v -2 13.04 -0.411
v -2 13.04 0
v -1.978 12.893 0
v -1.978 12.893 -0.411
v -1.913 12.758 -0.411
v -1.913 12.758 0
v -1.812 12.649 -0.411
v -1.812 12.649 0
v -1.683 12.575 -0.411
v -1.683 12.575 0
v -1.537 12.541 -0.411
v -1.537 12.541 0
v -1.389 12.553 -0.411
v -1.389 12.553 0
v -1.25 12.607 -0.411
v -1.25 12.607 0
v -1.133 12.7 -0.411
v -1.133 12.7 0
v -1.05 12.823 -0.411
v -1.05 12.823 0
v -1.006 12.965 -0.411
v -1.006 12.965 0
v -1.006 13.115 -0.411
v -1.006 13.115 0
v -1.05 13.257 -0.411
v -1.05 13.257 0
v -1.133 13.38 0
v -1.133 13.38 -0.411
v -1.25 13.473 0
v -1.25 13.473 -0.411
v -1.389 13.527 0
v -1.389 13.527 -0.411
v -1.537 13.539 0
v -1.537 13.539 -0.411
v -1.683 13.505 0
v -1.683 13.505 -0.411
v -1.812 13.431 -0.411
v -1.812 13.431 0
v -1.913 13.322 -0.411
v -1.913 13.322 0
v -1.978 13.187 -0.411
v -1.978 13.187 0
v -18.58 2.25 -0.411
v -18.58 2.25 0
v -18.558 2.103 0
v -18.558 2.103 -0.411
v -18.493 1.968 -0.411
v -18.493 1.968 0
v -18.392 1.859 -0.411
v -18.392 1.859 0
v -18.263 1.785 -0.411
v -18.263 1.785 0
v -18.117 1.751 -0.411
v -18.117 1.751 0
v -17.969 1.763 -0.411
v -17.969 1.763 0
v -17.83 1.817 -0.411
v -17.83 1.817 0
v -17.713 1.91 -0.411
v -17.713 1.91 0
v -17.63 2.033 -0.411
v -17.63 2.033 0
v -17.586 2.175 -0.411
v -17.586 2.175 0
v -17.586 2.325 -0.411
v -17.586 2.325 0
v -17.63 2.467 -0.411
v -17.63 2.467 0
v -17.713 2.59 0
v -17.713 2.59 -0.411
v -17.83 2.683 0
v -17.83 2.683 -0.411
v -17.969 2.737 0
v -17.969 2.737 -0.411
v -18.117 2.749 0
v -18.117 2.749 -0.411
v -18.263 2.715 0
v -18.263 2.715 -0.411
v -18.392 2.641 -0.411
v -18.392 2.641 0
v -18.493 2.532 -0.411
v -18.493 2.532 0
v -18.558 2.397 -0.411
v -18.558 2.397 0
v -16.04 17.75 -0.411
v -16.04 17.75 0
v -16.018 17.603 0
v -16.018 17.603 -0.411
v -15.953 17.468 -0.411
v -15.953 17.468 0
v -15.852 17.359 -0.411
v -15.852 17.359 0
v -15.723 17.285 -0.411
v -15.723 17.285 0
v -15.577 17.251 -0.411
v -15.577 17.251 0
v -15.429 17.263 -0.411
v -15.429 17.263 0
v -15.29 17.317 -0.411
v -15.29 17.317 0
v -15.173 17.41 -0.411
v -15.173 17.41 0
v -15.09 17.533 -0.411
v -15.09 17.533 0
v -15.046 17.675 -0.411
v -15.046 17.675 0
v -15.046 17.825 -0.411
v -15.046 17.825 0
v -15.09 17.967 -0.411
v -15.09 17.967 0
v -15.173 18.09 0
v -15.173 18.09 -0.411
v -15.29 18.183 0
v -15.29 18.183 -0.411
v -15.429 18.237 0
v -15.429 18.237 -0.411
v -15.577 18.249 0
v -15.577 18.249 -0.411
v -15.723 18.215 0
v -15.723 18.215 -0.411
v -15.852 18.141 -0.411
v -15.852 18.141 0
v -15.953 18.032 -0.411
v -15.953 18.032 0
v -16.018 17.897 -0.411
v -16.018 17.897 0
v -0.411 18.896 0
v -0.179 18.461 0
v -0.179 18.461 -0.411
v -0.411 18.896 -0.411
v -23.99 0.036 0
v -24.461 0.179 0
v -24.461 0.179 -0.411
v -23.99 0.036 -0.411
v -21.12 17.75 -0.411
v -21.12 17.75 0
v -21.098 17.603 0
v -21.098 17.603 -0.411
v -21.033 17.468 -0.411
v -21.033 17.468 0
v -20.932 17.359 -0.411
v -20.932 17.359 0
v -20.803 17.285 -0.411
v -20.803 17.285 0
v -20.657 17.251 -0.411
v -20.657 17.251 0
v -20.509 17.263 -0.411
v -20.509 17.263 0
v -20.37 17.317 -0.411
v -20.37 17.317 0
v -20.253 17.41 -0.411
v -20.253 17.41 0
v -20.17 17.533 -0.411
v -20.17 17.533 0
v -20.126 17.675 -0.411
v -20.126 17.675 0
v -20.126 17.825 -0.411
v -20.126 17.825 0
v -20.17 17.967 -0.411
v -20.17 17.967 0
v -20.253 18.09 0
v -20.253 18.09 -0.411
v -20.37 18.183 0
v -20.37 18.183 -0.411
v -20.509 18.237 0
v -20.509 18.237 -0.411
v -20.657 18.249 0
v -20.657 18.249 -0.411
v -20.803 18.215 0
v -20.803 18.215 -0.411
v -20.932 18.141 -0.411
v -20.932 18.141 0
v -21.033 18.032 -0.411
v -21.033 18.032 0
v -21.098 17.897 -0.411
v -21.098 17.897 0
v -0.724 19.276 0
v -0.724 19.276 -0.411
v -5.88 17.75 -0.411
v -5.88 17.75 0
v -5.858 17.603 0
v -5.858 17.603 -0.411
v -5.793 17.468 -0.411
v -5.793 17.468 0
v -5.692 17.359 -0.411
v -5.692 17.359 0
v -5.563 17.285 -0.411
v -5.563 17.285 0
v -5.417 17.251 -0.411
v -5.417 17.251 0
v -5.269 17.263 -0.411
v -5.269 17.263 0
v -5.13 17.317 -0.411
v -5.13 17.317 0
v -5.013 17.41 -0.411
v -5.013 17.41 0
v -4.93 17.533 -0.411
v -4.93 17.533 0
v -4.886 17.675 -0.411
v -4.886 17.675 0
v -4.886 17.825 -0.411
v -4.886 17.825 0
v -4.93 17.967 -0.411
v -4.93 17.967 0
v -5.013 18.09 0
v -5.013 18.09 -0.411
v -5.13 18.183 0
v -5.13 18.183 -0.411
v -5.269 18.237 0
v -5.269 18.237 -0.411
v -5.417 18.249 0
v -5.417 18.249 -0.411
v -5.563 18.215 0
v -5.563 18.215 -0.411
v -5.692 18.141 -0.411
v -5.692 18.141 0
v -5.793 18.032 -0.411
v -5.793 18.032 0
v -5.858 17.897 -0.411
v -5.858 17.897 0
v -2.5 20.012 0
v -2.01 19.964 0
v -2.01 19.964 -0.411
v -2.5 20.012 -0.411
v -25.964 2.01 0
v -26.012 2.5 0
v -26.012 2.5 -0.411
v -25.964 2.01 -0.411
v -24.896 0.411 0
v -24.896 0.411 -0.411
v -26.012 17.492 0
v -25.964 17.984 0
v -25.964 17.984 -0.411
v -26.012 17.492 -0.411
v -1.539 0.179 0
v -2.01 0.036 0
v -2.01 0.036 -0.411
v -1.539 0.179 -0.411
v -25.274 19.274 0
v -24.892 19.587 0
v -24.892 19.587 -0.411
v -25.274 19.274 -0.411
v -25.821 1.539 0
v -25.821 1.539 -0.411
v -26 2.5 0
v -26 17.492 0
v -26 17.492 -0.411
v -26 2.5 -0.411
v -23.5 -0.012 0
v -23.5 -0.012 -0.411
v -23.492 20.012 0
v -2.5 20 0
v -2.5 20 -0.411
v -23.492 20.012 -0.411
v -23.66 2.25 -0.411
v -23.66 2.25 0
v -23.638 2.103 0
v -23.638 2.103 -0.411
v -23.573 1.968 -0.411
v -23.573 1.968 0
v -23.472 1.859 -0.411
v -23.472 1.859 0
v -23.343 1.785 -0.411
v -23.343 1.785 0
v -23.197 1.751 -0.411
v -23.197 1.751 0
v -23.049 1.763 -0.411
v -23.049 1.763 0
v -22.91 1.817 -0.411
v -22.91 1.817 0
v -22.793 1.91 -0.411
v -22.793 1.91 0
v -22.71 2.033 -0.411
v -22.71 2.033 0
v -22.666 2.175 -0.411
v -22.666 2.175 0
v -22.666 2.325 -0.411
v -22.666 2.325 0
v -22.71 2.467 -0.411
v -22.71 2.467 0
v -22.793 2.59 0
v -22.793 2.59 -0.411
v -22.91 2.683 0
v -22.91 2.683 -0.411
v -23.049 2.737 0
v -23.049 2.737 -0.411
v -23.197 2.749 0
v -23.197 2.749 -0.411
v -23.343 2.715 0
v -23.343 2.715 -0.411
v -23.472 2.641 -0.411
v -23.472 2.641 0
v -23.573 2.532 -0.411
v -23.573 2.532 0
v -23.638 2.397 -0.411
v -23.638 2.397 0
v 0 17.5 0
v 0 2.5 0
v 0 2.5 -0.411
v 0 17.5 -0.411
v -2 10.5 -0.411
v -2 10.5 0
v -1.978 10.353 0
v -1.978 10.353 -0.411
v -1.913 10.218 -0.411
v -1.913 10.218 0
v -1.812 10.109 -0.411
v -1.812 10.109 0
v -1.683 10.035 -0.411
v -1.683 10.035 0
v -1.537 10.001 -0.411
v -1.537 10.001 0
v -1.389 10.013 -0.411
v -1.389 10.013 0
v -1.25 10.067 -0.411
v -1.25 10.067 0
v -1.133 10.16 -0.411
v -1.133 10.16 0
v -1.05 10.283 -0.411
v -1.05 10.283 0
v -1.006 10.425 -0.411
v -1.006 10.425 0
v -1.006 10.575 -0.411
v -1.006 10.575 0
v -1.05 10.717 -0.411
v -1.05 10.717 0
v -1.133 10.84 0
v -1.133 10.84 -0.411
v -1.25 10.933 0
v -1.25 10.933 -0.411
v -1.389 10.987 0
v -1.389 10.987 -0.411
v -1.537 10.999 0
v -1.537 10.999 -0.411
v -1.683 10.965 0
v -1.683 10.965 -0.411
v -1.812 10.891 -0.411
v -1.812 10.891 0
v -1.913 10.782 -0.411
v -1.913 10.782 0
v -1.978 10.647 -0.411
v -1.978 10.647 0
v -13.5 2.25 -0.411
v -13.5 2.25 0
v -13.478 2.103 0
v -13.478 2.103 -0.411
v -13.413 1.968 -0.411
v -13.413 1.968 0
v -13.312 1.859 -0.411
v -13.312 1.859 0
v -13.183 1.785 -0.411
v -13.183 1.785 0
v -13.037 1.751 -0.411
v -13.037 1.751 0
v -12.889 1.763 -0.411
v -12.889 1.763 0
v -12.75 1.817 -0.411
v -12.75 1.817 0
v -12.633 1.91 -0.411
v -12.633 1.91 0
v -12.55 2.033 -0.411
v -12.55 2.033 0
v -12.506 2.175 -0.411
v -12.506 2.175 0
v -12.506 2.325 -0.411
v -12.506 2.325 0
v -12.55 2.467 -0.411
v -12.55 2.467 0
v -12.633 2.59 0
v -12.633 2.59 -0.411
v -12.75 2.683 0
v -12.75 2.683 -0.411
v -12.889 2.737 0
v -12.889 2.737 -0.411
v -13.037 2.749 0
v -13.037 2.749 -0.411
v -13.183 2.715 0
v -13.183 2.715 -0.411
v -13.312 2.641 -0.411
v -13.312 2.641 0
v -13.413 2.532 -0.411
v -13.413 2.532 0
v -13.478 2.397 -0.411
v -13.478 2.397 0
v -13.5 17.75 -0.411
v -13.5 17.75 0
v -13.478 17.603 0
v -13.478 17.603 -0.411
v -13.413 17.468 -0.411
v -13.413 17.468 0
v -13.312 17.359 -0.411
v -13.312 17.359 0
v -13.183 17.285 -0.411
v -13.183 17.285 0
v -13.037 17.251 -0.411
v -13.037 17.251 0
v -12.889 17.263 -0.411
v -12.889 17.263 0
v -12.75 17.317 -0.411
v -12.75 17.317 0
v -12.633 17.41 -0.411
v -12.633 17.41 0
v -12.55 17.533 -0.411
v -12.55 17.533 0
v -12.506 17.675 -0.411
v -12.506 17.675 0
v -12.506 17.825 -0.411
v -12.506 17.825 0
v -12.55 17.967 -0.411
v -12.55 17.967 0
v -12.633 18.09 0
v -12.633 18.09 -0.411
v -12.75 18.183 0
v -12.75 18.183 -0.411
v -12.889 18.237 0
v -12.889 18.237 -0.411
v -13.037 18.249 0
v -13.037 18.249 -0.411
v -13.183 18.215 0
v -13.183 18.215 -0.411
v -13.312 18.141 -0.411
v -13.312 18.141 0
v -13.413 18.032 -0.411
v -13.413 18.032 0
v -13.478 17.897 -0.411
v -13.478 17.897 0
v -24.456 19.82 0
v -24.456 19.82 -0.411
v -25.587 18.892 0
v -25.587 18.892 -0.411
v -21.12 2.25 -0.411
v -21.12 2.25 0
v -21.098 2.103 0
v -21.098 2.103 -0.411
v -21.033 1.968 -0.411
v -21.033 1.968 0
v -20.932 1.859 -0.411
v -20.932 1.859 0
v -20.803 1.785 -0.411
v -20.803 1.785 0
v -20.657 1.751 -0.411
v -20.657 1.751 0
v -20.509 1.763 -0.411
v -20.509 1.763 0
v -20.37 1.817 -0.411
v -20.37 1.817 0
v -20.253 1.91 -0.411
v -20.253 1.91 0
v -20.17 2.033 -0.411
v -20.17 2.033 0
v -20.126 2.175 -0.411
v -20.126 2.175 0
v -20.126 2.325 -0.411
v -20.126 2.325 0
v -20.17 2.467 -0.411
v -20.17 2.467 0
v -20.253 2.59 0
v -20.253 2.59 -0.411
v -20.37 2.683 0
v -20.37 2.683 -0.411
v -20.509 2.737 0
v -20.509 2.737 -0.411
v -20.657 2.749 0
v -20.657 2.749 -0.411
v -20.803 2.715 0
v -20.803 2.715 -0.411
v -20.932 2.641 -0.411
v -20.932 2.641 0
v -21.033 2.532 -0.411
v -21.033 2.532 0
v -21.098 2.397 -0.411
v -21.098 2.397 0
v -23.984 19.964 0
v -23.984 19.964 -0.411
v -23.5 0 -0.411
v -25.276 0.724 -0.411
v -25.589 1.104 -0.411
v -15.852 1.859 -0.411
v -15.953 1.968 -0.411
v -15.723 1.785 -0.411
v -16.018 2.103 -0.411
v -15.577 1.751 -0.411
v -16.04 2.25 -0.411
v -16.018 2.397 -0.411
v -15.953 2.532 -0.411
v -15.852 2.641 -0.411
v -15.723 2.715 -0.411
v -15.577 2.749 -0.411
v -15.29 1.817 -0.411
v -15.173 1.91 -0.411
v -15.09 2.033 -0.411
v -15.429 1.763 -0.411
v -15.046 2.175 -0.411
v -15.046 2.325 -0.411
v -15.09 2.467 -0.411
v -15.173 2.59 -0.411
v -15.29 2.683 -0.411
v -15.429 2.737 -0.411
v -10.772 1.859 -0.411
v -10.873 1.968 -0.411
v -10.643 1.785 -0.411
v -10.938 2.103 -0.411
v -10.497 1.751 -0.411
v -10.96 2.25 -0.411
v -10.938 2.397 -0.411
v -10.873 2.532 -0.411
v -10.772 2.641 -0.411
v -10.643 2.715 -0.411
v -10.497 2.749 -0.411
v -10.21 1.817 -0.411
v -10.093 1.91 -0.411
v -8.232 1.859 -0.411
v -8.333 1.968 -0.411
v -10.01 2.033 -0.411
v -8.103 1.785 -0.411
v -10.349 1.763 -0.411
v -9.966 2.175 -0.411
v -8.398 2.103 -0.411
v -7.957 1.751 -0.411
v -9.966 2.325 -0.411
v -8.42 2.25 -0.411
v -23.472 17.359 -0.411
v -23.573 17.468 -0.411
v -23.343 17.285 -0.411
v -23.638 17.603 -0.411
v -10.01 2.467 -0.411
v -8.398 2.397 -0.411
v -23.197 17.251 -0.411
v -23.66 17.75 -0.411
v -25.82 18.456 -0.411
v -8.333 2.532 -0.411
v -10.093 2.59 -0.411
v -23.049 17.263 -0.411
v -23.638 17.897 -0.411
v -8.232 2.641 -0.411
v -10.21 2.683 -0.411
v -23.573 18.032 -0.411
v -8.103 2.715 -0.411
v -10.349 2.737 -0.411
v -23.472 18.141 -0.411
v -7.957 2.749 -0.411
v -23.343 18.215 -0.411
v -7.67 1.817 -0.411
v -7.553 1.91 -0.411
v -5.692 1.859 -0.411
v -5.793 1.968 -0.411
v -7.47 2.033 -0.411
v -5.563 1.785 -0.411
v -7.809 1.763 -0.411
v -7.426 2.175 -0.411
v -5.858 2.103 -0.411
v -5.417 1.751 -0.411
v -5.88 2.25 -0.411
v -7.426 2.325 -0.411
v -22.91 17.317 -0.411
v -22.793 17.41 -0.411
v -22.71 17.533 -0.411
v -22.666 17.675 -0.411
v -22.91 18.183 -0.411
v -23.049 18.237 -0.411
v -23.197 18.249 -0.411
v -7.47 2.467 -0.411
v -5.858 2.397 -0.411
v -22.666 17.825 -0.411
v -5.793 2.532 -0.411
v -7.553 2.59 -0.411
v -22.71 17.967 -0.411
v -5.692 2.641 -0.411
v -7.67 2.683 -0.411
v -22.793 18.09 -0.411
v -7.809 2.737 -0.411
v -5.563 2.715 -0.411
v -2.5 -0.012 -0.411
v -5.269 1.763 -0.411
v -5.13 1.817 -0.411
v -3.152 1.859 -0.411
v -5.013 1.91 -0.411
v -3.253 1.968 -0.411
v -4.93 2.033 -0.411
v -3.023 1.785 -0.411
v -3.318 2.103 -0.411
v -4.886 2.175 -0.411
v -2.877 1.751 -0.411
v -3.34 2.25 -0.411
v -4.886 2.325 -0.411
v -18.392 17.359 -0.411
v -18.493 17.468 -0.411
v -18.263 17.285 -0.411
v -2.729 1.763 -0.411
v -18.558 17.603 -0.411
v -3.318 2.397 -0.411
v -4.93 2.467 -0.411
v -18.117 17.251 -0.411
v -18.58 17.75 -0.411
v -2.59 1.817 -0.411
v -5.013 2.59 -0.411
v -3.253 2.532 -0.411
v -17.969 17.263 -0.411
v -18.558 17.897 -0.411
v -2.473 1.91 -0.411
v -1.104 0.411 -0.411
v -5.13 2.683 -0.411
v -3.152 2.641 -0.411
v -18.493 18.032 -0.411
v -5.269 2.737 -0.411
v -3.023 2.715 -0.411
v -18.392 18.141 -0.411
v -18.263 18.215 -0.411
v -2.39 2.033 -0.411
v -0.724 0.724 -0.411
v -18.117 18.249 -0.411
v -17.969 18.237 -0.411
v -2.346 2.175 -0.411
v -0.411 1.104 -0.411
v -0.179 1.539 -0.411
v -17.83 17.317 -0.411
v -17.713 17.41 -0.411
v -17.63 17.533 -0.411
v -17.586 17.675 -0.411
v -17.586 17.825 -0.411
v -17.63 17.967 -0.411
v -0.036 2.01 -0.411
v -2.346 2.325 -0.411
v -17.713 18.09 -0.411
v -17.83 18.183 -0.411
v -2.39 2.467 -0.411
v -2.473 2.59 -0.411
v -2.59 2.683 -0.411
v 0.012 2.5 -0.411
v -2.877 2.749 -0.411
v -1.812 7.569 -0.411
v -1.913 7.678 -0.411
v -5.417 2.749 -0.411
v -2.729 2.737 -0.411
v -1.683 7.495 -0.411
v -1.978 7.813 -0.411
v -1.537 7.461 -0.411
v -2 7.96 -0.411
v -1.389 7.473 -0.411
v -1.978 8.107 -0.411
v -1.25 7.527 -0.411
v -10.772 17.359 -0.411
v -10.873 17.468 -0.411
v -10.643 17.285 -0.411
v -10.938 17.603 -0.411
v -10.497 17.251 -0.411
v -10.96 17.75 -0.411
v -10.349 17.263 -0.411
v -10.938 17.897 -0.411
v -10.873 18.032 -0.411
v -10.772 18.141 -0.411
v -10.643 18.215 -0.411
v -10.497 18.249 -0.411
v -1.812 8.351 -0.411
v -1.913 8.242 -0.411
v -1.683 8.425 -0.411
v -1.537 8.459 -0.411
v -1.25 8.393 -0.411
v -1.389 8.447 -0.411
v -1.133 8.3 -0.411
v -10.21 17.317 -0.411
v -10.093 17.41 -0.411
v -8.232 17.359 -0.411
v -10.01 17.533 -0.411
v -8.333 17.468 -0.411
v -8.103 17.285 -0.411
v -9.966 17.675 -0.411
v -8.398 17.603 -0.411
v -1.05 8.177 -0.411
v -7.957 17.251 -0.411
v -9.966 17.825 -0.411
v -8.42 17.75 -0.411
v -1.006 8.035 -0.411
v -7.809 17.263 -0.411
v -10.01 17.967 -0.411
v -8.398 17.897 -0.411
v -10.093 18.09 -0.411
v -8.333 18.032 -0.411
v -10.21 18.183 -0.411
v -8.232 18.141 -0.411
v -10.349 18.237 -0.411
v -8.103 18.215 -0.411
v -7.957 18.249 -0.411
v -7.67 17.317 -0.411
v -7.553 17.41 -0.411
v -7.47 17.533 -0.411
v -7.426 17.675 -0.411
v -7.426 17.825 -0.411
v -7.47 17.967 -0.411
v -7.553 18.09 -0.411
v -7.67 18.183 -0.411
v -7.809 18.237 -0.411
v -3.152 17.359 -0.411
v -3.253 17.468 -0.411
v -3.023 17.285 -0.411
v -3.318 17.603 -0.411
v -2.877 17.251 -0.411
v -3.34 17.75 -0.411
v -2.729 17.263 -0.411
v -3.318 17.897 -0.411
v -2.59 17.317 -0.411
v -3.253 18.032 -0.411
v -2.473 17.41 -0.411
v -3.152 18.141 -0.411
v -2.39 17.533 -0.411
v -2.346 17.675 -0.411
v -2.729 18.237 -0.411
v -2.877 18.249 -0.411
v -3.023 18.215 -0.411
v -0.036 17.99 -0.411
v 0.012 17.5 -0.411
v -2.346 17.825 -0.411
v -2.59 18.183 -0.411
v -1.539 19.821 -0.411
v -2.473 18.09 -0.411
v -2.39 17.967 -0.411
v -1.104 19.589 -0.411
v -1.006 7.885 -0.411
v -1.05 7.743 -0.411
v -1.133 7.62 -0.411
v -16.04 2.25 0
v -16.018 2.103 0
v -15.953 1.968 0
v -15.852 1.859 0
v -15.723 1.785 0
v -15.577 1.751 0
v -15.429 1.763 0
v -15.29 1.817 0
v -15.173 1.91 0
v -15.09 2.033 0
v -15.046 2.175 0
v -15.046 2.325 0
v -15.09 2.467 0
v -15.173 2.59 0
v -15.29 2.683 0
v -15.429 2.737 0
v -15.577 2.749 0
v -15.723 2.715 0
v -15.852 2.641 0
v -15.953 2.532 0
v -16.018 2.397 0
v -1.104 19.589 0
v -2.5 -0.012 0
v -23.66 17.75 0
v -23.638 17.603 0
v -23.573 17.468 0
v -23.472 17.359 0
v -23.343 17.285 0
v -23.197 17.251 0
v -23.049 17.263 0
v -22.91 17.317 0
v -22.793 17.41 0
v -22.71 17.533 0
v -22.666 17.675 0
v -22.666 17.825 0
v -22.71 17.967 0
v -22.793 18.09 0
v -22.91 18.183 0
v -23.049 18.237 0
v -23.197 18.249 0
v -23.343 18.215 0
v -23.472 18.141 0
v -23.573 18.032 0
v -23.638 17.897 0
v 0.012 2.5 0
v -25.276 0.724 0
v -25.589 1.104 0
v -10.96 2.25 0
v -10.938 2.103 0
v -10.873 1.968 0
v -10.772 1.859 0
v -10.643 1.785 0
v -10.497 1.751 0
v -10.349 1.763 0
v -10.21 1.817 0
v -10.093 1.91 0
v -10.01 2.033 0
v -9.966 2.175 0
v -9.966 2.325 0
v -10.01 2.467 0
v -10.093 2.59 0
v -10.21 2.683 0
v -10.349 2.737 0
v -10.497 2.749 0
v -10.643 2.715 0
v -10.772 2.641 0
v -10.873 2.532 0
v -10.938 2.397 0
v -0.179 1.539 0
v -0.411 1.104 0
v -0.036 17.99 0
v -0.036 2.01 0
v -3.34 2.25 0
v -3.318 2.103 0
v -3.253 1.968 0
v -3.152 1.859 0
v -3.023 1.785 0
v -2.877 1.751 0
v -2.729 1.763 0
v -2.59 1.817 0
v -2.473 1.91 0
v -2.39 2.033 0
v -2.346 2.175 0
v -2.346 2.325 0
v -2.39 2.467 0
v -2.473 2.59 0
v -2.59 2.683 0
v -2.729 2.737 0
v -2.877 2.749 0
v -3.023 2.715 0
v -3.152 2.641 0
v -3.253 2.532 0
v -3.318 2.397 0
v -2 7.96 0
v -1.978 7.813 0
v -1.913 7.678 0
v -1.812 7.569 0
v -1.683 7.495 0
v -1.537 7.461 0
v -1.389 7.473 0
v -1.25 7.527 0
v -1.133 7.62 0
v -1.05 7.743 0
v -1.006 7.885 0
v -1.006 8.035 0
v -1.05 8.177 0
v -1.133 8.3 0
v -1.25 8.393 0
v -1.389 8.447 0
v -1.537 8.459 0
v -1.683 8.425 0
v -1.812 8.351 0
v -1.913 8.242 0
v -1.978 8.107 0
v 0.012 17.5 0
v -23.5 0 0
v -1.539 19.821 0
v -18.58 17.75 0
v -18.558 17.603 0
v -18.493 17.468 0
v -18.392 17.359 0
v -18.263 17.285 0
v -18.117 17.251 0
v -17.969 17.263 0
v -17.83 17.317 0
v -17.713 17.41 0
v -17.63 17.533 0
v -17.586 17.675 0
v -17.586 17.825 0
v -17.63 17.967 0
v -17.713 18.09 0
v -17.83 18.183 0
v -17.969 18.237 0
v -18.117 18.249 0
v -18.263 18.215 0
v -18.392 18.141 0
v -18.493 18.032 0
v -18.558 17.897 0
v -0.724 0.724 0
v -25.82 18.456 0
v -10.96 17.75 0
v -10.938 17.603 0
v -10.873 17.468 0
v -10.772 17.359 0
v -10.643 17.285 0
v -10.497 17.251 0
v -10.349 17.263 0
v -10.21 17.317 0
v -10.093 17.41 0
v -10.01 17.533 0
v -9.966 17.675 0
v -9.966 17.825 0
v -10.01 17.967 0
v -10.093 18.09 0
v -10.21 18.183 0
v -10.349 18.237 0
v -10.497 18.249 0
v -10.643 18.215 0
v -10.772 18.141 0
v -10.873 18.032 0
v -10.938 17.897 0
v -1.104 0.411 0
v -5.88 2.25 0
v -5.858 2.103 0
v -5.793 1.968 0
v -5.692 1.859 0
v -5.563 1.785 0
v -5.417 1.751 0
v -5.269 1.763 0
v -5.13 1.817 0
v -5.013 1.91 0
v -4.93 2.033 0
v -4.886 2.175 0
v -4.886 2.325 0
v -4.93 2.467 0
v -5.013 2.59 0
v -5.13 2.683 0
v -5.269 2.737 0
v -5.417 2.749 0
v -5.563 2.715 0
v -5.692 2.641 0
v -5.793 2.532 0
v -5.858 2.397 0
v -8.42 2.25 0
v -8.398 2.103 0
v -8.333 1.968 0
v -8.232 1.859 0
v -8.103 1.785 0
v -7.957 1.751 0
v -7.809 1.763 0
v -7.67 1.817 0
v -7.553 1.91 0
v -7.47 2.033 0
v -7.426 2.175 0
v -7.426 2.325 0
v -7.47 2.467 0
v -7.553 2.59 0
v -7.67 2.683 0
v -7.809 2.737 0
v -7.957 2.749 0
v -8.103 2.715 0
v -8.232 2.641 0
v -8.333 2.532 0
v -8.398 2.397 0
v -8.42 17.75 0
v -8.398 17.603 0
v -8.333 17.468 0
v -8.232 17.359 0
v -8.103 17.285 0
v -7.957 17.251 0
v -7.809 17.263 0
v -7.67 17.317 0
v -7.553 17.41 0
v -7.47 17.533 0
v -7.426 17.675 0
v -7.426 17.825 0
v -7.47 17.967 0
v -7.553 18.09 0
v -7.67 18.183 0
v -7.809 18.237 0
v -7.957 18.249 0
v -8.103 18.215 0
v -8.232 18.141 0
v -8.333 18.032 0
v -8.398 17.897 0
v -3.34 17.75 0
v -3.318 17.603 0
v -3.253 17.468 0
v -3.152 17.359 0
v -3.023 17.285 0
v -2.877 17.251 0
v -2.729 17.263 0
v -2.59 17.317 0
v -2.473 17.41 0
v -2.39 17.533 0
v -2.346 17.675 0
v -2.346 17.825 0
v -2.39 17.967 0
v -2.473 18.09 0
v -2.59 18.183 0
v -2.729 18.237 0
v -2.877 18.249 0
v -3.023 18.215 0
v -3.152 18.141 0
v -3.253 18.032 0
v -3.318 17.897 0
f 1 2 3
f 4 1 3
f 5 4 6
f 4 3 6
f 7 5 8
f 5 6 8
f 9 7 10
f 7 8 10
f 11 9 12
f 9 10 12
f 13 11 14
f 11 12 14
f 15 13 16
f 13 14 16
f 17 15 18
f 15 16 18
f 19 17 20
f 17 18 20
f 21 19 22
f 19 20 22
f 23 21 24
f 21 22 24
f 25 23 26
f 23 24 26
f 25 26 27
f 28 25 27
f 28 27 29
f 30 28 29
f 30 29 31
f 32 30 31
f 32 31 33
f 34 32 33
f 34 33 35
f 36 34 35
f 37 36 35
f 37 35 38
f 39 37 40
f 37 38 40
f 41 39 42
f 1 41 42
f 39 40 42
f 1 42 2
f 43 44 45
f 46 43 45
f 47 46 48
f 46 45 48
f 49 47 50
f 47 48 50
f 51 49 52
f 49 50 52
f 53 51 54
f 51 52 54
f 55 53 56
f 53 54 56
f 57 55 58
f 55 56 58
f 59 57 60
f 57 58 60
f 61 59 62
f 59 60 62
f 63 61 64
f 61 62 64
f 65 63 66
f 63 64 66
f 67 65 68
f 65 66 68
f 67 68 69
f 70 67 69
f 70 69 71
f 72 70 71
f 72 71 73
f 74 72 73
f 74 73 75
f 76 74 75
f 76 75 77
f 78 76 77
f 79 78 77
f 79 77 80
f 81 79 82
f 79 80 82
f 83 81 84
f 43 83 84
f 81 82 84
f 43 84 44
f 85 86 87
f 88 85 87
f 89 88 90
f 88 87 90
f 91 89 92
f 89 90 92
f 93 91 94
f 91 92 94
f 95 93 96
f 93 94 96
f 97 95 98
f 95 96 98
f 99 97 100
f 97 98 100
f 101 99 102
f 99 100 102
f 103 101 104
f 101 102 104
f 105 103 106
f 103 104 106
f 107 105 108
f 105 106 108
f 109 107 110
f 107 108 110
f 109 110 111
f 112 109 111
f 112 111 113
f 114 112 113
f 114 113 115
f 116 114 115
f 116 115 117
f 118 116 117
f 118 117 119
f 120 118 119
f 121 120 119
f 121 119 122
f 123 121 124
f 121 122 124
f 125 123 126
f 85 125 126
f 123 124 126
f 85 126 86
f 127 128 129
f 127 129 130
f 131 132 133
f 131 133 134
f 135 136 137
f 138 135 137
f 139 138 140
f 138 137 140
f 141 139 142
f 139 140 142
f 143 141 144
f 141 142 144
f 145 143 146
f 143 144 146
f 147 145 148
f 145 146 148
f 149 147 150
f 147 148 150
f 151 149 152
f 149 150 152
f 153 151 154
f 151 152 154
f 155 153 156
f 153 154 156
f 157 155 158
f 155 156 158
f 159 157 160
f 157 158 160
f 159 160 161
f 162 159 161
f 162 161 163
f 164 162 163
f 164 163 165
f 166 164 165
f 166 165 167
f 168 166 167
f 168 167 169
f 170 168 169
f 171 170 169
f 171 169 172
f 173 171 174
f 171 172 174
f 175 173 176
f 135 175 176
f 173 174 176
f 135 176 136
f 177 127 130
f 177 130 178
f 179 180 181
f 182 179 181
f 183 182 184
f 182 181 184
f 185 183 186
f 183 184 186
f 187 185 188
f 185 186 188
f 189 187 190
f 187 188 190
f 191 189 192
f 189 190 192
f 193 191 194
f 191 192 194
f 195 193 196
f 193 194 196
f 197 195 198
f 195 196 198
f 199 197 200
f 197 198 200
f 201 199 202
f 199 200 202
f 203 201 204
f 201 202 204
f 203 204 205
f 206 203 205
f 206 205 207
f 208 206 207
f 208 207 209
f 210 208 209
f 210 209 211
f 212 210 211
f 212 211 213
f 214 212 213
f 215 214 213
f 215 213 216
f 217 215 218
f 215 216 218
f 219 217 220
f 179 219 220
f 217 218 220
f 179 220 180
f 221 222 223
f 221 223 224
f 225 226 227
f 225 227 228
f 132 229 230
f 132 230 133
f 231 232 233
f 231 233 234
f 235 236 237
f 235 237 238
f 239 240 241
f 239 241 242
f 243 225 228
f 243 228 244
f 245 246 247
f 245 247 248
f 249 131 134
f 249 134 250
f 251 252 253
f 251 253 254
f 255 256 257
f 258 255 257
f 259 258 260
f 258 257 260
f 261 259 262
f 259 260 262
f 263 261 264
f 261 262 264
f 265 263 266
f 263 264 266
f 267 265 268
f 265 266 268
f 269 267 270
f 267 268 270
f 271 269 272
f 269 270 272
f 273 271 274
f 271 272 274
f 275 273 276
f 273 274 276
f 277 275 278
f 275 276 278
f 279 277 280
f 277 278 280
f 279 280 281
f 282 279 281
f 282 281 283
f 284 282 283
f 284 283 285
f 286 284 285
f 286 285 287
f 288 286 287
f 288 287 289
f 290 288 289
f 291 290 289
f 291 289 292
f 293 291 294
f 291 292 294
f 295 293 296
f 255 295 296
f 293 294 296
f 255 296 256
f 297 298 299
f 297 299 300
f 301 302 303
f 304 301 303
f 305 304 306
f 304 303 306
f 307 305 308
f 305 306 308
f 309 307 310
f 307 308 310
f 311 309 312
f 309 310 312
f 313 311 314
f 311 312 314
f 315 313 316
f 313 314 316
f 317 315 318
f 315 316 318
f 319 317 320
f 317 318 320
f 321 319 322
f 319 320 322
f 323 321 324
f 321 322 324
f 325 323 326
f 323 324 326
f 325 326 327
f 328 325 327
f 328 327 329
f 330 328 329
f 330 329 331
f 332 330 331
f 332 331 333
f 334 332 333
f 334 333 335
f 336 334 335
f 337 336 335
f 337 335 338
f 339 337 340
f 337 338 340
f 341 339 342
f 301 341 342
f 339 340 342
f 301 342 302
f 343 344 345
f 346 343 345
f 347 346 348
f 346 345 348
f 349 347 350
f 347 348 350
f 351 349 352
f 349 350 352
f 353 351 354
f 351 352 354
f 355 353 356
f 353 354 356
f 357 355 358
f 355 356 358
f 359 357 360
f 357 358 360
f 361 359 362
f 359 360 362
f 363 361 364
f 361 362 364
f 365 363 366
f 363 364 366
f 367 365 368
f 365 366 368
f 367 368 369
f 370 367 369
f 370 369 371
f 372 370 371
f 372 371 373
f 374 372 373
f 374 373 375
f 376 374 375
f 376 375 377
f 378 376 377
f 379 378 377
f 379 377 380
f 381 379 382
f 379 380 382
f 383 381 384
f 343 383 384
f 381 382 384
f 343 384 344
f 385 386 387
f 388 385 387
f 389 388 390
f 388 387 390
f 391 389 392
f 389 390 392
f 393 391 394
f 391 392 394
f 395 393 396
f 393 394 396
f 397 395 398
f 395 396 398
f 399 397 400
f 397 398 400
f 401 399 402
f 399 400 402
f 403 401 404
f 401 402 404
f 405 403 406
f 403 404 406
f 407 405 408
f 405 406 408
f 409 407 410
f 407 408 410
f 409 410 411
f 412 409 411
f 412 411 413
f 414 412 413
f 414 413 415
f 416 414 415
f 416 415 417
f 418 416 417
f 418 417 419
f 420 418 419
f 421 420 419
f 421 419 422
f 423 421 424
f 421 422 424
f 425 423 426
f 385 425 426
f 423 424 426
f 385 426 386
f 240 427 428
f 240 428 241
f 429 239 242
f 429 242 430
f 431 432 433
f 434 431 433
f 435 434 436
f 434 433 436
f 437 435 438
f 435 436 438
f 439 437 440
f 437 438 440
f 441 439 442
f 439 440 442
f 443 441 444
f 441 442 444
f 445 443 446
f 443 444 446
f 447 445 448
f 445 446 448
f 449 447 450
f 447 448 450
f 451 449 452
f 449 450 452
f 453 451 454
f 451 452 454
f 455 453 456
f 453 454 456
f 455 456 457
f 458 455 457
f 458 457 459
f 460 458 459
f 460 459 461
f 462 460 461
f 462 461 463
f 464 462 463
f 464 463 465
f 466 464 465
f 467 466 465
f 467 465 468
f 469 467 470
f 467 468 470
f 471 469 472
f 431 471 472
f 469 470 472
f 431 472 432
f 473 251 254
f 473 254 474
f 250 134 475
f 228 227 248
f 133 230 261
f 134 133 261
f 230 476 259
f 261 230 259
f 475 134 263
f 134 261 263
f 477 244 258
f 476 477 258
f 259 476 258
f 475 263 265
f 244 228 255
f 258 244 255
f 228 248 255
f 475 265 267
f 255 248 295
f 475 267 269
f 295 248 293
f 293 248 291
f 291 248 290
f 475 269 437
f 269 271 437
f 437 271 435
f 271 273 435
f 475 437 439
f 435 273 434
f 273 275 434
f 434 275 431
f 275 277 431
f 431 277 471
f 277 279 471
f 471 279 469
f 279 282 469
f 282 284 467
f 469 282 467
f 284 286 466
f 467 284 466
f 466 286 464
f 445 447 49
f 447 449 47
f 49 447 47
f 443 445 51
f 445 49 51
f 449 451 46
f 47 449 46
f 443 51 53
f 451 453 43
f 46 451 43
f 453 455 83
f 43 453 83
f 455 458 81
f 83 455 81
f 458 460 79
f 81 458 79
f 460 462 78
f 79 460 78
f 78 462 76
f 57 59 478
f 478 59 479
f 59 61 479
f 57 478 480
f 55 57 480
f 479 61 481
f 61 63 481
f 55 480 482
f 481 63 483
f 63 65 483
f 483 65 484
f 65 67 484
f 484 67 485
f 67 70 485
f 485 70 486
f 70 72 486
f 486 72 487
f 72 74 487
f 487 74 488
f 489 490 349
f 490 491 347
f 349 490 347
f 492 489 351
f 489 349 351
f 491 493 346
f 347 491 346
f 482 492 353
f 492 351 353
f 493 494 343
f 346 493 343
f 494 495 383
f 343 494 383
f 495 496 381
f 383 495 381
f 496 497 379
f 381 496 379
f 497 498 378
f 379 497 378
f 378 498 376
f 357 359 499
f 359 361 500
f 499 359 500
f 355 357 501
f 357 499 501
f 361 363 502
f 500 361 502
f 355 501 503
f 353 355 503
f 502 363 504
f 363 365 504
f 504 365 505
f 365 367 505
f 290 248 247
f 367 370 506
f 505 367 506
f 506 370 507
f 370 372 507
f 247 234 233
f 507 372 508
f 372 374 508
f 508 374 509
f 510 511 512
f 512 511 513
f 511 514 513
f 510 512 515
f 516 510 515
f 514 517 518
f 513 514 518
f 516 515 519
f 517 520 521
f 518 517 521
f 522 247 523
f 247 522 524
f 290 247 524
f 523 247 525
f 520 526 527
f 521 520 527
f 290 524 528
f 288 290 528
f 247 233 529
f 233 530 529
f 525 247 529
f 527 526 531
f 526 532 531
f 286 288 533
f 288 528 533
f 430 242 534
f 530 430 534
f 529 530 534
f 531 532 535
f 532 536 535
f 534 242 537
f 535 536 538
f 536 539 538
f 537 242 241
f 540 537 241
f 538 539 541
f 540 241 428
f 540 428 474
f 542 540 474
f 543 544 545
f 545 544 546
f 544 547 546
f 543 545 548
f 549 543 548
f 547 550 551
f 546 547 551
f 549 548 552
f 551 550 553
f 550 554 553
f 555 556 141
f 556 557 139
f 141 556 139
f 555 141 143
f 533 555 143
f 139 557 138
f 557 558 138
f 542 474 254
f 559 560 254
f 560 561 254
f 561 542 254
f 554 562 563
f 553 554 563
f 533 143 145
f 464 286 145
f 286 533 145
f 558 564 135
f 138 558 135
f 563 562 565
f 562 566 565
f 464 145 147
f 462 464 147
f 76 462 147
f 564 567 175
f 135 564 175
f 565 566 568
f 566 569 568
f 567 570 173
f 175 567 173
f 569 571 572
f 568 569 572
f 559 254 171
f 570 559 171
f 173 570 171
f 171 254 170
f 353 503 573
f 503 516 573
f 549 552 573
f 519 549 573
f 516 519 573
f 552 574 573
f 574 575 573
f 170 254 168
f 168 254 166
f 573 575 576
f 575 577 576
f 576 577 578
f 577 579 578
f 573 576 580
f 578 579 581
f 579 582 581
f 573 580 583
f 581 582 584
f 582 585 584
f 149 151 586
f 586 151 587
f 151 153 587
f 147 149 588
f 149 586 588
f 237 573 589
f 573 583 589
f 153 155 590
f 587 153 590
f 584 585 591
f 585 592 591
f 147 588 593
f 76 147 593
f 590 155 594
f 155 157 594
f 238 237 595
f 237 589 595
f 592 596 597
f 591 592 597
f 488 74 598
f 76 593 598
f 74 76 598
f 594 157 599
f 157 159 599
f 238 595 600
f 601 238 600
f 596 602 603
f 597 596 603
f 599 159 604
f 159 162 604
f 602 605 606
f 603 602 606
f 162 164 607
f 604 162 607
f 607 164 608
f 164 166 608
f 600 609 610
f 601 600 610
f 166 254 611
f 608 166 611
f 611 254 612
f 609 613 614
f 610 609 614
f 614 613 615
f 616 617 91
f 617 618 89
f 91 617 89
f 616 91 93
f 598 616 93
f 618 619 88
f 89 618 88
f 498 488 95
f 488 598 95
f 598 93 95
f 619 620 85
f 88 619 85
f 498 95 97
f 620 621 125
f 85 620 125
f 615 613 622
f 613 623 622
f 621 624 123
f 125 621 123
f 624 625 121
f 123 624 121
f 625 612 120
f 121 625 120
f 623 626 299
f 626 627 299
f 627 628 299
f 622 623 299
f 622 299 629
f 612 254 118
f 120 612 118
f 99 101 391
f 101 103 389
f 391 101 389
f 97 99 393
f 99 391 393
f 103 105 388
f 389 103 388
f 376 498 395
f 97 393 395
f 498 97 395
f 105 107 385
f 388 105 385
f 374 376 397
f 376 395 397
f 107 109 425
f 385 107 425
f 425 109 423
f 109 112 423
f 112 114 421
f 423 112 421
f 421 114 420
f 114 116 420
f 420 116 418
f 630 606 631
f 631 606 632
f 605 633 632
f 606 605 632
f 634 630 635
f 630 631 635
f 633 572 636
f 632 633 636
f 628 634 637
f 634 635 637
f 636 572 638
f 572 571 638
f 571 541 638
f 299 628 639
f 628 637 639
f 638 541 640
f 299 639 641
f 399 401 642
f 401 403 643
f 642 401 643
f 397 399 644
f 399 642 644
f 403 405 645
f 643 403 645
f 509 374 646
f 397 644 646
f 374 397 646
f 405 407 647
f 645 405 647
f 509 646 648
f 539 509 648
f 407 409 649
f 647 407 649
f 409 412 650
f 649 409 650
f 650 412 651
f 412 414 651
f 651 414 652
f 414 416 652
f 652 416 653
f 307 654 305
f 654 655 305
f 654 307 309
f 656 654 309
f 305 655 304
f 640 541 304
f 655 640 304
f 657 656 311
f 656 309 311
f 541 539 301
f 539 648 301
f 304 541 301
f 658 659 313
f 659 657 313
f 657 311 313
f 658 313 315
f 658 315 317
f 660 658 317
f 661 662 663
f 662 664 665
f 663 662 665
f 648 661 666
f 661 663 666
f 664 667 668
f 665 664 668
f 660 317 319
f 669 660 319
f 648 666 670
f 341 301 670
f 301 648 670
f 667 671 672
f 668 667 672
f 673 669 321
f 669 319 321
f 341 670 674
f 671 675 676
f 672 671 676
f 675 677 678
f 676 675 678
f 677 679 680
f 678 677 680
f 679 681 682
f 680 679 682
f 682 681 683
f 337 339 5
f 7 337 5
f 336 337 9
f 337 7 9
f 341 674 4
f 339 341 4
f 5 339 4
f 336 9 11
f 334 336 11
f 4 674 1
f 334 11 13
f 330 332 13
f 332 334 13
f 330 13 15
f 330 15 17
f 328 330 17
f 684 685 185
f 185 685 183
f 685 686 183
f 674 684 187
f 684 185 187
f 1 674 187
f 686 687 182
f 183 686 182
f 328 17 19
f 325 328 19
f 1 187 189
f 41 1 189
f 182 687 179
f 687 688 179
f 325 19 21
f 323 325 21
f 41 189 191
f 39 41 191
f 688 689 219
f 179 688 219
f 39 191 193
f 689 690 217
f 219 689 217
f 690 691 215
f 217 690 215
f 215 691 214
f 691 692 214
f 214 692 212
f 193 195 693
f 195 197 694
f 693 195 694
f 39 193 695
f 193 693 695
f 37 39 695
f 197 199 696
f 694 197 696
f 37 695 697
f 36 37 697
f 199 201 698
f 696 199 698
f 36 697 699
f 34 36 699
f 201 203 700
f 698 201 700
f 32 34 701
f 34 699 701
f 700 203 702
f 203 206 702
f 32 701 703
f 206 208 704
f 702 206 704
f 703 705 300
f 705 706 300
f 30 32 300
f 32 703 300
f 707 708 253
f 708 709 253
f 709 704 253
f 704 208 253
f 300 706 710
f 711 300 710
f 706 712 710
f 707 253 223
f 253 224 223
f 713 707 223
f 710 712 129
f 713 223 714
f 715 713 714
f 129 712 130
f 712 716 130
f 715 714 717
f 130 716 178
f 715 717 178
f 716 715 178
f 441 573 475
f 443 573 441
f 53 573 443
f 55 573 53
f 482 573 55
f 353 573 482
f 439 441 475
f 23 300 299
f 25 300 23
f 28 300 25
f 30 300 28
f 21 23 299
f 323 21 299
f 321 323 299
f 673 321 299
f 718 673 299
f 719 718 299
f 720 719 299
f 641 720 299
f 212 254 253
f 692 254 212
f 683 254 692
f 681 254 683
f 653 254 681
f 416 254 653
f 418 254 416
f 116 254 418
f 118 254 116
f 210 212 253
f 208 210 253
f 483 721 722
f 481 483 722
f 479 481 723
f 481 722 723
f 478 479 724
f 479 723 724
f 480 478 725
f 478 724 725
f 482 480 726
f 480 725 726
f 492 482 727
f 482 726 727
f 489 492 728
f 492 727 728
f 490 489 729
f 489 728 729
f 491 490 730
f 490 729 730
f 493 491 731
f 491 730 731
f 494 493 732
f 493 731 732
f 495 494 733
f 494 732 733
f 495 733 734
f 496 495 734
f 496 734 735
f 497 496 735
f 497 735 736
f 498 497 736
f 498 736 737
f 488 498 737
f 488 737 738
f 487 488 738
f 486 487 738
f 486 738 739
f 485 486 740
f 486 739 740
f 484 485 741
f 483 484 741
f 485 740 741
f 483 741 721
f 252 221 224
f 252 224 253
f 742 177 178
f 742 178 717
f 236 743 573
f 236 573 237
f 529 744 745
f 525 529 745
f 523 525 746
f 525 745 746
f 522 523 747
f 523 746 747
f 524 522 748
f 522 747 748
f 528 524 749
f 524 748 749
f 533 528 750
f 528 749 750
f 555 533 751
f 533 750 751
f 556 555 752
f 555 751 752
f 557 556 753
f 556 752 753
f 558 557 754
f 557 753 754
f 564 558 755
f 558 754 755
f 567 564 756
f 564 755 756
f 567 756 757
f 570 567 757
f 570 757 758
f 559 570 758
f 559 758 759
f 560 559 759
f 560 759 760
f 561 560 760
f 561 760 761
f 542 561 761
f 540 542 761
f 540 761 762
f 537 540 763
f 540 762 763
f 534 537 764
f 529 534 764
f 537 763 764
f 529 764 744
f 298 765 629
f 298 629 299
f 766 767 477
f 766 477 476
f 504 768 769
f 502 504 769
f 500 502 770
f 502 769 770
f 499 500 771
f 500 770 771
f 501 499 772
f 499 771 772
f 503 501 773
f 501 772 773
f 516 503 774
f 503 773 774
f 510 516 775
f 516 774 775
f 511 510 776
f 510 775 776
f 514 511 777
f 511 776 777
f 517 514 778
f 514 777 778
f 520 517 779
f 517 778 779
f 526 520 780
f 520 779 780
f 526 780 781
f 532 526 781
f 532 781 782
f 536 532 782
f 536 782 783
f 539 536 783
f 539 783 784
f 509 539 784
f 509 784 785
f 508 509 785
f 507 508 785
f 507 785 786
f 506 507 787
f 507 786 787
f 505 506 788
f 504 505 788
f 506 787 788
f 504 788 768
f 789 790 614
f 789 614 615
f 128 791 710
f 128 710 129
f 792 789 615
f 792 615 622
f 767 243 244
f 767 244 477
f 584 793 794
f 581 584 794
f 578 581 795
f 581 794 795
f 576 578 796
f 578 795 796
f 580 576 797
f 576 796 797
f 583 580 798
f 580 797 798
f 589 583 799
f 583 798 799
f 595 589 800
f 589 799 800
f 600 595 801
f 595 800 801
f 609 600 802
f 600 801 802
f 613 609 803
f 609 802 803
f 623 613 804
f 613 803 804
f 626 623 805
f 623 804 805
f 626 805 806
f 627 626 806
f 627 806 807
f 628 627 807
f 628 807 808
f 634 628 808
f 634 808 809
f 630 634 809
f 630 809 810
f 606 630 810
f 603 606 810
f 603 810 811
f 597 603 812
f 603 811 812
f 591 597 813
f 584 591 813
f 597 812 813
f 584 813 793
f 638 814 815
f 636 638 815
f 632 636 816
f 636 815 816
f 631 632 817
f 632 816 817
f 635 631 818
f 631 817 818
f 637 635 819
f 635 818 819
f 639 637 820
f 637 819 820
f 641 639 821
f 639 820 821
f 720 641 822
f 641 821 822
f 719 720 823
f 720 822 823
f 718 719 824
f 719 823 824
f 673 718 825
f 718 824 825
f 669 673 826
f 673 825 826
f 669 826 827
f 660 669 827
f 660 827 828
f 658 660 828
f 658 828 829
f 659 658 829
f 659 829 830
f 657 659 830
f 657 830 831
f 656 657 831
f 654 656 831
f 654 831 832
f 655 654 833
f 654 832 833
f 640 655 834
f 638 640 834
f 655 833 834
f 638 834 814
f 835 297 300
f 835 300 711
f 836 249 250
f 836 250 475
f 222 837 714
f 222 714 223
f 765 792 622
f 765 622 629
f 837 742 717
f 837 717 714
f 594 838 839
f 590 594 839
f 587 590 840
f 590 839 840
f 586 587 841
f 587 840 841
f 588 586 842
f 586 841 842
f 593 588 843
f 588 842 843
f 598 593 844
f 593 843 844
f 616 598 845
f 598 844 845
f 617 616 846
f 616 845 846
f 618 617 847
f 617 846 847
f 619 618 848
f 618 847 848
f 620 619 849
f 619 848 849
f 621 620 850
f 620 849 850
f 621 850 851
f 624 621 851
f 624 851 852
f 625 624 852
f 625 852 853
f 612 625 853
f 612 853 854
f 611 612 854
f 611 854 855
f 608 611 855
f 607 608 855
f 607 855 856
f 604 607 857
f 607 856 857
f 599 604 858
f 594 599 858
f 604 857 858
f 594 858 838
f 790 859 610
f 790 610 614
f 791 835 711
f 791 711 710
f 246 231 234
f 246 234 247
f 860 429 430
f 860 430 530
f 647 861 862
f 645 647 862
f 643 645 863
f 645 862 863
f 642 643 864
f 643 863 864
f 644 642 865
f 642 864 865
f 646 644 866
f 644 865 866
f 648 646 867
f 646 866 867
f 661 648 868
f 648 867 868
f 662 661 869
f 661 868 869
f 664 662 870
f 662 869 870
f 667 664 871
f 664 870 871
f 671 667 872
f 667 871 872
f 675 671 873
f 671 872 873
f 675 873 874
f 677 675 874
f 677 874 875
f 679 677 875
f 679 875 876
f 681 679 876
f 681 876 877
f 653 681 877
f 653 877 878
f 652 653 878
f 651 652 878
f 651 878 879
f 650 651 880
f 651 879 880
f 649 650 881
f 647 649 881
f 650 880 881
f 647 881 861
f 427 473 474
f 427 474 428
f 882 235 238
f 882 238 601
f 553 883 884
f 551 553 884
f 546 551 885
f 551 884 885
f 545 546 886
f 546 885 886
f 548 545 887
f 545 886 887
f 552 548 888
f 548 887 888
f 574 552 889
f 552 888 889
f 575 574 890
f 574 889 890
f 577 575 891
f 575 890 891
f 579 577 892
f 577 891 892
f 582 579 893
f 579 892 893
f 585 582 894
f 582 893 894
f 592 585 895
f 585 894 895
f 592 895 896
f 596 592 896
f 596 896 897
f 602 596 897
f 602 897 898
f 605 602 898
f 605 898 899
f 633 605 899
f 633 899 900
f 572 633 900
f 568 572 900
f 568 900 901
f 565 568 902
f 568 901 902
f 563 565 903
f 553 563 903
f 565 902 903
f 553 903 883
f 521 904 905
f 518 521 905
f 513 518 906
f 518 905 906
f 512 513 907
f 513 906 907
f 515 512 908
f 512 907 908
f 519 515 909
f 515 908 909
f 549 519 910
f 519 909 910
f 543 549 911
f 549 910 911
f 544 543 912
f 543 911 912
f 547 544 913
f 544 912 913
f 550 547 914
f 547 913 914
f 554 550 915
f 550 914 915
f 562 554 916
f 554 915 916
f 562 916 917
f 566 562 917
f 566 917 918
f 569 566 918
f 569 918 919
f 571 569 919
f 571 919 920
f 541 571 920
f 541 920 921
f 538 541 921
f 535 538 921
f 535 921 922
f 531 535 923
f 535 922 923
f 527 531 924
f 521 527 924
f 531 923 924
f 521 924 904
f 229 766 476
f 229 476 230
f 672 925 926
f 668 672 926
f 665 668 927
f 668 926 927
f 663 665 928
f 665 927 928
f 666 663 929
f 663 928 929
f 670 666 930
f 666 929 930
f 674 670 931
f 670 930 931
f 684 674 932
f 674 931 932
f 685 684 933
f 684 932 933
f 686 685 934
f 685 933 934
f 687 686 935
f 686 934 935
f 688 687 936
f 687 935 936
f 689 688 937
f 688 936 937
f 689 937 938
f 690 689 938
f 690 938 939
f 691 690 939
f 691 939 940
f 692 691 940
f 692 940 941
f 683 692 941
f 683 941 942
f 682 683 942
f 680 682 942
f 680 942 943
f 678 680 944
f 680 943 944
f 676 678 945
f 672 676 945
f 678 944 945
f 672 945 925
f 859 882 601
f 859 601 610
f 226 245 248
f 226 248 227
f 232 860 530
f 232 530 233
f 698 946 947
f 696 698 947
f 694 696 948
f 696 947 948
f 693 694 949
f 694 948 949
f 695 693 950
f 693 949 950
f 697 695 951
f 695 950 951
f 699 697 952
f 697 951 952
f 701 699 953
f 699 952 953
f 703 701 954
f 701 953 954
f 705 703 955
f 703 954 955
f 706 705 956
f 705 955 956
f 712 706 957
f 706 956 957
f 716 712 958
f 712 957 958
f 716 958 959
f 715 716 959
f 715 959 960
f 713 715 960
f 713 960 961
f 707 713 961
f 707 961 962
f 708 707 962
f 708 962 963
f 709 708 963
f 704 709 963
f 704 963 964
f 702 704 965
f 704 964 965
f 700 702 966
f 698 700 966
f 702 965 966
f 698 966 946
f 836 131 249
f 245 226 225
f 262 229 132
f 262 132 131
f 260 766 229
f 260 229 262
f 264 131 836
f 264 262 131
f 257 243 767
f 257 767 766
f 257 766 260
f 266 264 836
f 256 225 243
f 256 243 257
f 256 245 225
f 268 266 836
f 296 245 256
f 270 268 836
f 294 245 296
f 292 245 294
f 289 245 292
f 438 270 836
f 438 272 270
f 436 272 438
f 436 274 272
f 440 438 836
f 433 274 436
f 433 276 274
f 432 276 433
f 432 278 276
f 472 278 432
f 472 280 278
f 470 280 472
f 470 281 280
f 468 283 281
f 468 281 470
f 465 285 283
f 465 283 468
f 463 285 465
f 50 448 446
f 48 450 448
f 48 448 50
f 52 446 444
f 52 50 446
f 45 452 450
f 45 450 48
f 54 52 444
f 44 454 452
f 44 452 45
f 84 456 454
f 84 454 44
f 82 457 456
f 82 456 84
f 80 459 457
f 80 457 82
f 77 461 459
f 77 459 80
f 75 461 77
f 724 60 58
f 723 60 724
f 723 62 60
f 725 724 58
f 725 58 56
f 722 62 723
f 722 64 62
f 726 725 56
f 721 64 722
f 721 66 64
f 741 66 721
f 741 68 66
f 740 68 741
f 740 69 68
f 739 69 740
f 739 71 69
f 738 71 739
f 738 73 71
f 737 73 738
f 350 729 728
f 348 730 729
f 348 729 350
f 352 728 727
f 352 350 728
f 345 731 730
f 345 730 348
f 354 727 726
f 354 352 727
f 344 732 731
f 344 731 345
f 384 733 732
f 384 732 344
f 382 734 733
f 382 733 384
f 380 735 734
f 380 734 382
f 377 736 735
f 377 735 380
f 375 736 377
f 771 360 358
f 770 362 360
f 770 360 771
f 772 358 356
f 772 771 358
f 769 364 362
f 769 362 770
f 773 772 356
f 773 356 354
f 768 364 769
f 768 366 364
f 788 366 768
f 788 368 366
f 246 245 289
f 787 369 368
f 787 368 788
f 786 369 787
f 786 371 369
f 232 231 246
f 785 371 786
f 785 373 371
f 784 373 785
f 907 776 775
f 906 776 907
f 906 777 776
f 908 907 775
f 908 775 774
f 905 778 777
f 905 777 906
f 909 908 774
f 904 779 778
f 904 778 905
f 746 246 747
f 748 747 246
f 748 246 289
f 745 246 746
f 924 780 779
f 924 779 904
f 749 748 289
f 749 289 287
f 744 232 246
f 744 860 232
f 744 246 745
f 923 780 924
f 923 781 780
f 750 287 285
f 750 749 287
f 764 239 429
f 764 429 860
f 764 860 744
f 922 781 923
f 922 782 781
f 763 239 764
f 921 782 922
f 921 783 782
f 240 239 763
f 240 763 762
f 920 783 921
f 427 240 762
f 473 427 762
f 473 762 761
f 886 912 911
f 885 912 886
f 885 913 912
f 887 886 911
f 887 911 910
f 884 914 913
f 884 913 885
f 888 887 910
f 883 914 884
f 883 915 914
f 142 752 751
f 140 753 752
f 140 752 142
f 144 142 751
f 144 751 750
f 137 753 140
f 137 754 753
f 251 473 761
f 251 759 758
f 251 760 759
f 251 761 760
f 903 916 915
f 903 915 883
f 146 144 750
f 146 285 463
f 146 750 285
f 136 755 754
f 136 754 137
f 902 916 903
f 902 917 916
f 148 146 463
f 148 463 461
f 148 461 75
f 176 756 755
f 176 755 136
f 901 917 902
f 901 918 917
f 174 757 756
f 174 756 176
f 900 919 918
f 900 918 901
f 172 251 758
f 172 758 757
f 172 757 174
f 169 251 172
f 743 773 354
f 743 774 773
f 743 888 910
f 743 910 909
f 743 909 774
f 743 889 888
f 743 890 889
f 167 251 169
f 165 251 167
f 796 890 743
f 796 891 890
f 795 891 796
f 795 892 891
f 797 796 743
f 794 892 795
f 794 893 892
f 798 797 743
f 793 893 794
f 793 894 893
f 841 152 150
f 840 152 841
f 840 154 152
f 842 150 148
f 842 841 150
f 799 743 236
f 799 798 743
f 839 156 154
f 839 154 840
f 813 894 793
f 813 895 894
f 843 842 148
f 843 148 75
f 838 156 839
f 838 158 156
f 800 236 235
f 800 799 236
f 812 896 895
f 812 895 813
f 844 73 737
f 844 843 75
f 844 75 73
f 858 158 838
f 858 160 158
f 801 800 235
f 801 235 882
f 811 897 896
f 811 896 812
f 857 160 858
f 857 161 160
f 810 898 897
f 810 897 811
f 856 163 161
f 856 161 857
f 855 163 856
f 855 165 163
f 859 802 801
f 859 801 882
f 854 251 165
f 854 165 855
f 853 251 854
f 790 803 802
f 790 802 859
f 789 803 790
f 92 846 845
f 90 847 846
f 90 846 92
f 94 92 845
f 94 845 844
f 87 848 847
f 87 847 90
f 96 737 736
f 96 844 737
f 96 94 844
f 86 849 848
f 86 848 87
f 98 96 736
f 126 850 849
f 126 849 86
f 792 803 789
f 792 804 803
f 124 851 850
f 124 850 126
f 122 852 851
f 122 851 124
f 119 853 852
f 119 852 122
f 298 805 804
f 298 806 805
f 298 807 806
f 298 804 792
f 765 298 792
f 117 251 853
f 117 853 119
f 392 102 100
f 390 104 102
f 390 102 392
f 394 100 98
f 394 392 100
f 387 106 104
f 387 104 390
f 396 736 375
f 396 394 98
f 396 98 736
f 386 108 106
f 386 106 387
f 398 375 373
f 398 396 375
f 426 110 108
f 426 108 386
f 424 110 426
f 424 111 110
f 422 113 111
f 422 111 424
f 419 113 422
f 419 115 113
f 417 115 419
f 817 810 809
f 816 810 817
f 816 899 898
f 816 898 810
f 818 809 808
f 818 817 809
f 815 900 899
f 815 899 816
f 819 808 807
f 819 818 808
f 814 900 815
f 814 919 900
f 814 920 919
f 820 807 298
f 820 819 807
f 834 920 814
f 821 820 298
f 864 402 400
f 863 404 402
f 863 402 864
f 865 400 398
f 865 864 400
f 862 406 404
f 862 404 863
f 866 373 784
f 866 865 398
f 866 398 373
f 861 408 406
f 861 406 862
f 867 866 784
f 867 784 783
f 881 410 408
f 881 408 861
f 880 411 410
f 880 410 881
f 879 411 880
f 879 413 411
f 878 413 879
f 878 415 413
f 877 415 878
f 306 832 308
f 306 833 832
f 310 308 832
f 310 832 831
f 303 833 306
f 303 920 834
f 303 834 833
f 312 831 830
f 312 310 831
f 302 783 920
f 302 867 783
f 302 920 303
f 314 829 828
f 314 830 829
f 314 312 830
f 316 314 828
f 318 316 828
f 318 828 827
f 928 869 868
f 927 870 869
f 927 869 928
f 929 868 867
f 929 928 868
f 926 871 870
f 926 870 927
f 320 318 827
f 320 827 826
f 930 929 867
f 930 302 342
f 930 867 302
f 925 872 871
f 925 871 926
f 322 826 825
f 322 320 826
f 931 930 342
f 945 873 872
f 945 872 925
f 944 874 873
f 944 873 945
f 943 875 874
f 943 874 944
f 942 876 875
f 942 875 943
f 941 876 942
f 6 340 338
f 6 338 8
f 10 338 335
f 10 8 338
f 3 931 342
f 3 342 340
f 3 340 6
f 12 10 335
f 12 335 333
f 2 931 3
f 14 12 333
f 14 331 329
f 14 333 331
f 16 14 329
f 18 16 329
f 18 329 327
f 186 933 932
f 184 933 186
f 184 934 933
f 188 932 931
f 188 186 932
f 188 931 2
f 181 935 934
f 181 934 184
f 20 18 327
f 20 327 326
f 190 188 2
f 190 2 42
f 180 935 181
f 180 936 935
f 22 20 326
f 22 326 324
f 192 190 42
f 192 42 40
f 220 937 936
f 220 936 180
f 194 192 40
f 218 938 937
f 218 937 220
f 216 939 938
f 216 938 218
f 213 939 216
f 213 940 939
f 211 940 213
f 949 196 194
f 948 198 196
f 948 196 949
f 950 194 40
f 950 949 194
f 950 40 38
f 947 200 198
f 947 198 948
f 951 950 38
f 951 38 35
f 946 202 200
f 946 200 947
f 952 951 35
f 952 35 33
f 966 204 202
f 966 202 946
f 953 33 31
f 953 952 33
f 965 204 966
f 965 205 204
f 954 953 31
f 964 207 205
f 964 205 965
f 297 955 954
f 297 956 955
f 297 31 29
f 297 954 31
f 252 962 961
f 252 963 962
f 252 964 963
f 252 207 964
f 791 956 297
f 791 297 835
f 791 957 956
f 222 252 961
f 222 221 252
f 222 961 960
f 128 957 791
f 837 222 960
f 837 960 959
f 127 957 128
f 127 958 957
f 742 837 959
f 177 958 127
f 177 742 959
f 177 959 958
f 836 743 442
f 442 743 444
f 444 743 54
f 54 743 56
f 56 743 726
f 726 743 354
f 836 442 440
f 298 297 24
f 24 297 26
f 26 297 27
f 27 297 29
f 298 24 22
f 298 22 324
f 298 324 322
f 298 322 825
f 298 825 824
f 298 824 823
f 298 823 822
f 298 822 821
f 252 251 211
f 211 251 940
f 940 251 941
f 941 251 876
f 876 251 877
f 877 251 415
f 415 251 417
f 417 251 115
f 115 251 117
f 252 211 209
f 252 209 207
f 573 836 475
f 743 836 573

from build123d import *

# Parameters (mm, degrees)
SKETCH_1_R      = 0.499999
EXTRUDE_1_DEPTH = 0.41148


with BuildPart() as part:
    # 草图1 → 凸台-拉伸1 (new body)
    with BuildSketch(Plane.XY):
        Polygon((-23.99008664, 0.03617468), (-23.50000126, -0.01209548), (-23.50000126, 0), (-2.50000008, -0.01209548), (-2.0099147, 0.03617468), (-1.53866342, 0.17912588), (-1.1043539, 0.41126918), (-0.72367902, 0.72367902), (-0.41126918, 1.1043539), (-0.17912588, 1.53866342), (-0.03617468, 2.0099147), (0.01209548, 2.50000008), (-1.27e-05, 2.50000008), (-1.27e-05, 17.50001326), (0.01209548, 17.50000056), (-0.03617468, 17.99008594), (-0.17912588, 18.46133722), (-0.41126918, 18.89564674), (-0.72367902, 19.27632162), (-1.1043539, 19.58873146), (-1.53866342, 19.82087476), (-2.0099147, 19.96382596), (-2.50000008, 20.01209612), (-2.50000008, 20.000013333), (-23.492043121, 20.012146936), (-23.98367568, 19.9637269), (-24.45643572, 19.82031596), (-24.89213462, 19.58743098), (-25.27402616, 19.27401784), (-25.5874393, 18.8921263), (-25.82032428, 18.4564274), (-25.96373522, 17.98366736), (-26.01215524, 17.49201734), (-26.0000115, 17.49201734), (-26.0000115, 2.50001278), (-26.01209682, 2.50000008), (-25.96382666, 2.0099147), (-25.82087546, 1.53866342), (-25.58873216, 1.1043539), (-25.27632232, 0.72367902), (-24.89564744, 0.41126918), (-24.46133792, 0.17912588), align=None)
        with Locations(Location((-23.1599867, 17.74997974, 0), (0, 0, 180))):
            Circle(SKETCH_1_R, mode=Mode.SUBTRACT)
        with Locations(Location((-20.6199867, 17.74997974, 0), (0, 0, 180))):
            Circle(SKETCH_1_R, mode=Mode.SUBTRACT)
        with Locations(Location((-20.6199867, 2.24998534, 0), (0, 0, 180))):
            Circle(SKETCH_1_R, mode=Mode.SUBTRACT)
        with Locations(Location((-15.5399867, 17.74997974, 0), (0, 0, 180))):
            Circle(SKETCH_1_R, mode=Mode.SUBTRACT)
        with Locations(Location((-12.9999867, 17.74997974, 0), (0, 0, 180))):
            Circle(SKETCH_1_R, mode=Mode.SUBTRACT)
        with Locations(Location((-18.0799867, 17.74997974, 0), (0, 0, 180))):
            Circle(SKETCH_1_R, mode=Mode.SUBTRACT)
        with Locations(Location((-18.0799867, 2.24998534, 0), (0, 0, 180))):
            Circle(SKETCH_1_R, mode=Mode.SUBTRACT)
        with Locations(Location((-15.5399867, 2.24998534, 0), (0, 0, 180))):
            Circle(SKETCH_1_R, mode=Mode.SUBTRACT)
        with Locations(Location((-23.1599867, 2.24998534, 0), (0, 0, 180))):
            Circle(SKETCH_1_R, mode=Mode.SUBTRACT)
        with Locations(Location((-10.4599867, 2.24998534, 0), (0, 0, 180))):
            Circle(SKETCH_1_R, mode=Mode.SUBTRACT)
        with Locations(Location((-12.9999867, 2.24998534, 0), (0, 0, 180))):
            Circle(SKETCH_1_R, mode=Mode.SUBTRACT)
        with Locations(Location((-7.9199867, 17.74997974, 0), (0, 0, 180))):
            Circle(SKETCH_1_R, mode=Mode.SUBTRACT)
        with Locations(Location((-5.3799867, 17.74997974, 0), (0, 0, 180))):
            Circle(SKETCH_1_R, mode=Mode.SUBTRACT)
        with Locations(Location((-10.4599867, 17.74997974, 0), (0, 0, 180))):
            Circle(SKETCH_1_R, mode=Mode.SUBTRACT)
        with Locations(Location((-2.8399867, 17.74997974, 0), (0, 0, 180))):
            Circle(SKETCH_1_R, mode=Mode.SUBTRACT)
        with Locations(Location((-1.49999954, 13.03999932, 0), (0, 0, 180))):
            Circle(SKETCH_1_R, mode=Mode.SUBTRACT)
        with Locations(Location((-5.3799867, 2.24998534, 0), (0, 0, 180))):
            Circle(SKETCH_1_R, mode=Mode.SUBTRACT)
        with Locations(Location((-2.8399867, 2.24998534, 0), (0, 0, 180))):
            Circle(SKETCH_1_R, mode=Mode.SUBTRACT)
        with Locations(Location((-7.9199867, 2.24998534, 0), (0, 0, 180))):
            Circle(SKETCH_1_R, mode=Mode.SUBTRACT)
        with Locations(Location((-1.49999954, 10.49999932, 0), (0, 0, 180))):
            Circle(SKETCH_1_R, mode=Mode.SUBTRACT)
        with Locations(Location((-1.49999954, 7.95999932, 0), (0, 0, 180))):
            Circle(SKETCH_1_R, mode=Mode.SUBTRACT)
    extrude(amount=-EXTRUDE_1_DEPTH)


solid = part.part
